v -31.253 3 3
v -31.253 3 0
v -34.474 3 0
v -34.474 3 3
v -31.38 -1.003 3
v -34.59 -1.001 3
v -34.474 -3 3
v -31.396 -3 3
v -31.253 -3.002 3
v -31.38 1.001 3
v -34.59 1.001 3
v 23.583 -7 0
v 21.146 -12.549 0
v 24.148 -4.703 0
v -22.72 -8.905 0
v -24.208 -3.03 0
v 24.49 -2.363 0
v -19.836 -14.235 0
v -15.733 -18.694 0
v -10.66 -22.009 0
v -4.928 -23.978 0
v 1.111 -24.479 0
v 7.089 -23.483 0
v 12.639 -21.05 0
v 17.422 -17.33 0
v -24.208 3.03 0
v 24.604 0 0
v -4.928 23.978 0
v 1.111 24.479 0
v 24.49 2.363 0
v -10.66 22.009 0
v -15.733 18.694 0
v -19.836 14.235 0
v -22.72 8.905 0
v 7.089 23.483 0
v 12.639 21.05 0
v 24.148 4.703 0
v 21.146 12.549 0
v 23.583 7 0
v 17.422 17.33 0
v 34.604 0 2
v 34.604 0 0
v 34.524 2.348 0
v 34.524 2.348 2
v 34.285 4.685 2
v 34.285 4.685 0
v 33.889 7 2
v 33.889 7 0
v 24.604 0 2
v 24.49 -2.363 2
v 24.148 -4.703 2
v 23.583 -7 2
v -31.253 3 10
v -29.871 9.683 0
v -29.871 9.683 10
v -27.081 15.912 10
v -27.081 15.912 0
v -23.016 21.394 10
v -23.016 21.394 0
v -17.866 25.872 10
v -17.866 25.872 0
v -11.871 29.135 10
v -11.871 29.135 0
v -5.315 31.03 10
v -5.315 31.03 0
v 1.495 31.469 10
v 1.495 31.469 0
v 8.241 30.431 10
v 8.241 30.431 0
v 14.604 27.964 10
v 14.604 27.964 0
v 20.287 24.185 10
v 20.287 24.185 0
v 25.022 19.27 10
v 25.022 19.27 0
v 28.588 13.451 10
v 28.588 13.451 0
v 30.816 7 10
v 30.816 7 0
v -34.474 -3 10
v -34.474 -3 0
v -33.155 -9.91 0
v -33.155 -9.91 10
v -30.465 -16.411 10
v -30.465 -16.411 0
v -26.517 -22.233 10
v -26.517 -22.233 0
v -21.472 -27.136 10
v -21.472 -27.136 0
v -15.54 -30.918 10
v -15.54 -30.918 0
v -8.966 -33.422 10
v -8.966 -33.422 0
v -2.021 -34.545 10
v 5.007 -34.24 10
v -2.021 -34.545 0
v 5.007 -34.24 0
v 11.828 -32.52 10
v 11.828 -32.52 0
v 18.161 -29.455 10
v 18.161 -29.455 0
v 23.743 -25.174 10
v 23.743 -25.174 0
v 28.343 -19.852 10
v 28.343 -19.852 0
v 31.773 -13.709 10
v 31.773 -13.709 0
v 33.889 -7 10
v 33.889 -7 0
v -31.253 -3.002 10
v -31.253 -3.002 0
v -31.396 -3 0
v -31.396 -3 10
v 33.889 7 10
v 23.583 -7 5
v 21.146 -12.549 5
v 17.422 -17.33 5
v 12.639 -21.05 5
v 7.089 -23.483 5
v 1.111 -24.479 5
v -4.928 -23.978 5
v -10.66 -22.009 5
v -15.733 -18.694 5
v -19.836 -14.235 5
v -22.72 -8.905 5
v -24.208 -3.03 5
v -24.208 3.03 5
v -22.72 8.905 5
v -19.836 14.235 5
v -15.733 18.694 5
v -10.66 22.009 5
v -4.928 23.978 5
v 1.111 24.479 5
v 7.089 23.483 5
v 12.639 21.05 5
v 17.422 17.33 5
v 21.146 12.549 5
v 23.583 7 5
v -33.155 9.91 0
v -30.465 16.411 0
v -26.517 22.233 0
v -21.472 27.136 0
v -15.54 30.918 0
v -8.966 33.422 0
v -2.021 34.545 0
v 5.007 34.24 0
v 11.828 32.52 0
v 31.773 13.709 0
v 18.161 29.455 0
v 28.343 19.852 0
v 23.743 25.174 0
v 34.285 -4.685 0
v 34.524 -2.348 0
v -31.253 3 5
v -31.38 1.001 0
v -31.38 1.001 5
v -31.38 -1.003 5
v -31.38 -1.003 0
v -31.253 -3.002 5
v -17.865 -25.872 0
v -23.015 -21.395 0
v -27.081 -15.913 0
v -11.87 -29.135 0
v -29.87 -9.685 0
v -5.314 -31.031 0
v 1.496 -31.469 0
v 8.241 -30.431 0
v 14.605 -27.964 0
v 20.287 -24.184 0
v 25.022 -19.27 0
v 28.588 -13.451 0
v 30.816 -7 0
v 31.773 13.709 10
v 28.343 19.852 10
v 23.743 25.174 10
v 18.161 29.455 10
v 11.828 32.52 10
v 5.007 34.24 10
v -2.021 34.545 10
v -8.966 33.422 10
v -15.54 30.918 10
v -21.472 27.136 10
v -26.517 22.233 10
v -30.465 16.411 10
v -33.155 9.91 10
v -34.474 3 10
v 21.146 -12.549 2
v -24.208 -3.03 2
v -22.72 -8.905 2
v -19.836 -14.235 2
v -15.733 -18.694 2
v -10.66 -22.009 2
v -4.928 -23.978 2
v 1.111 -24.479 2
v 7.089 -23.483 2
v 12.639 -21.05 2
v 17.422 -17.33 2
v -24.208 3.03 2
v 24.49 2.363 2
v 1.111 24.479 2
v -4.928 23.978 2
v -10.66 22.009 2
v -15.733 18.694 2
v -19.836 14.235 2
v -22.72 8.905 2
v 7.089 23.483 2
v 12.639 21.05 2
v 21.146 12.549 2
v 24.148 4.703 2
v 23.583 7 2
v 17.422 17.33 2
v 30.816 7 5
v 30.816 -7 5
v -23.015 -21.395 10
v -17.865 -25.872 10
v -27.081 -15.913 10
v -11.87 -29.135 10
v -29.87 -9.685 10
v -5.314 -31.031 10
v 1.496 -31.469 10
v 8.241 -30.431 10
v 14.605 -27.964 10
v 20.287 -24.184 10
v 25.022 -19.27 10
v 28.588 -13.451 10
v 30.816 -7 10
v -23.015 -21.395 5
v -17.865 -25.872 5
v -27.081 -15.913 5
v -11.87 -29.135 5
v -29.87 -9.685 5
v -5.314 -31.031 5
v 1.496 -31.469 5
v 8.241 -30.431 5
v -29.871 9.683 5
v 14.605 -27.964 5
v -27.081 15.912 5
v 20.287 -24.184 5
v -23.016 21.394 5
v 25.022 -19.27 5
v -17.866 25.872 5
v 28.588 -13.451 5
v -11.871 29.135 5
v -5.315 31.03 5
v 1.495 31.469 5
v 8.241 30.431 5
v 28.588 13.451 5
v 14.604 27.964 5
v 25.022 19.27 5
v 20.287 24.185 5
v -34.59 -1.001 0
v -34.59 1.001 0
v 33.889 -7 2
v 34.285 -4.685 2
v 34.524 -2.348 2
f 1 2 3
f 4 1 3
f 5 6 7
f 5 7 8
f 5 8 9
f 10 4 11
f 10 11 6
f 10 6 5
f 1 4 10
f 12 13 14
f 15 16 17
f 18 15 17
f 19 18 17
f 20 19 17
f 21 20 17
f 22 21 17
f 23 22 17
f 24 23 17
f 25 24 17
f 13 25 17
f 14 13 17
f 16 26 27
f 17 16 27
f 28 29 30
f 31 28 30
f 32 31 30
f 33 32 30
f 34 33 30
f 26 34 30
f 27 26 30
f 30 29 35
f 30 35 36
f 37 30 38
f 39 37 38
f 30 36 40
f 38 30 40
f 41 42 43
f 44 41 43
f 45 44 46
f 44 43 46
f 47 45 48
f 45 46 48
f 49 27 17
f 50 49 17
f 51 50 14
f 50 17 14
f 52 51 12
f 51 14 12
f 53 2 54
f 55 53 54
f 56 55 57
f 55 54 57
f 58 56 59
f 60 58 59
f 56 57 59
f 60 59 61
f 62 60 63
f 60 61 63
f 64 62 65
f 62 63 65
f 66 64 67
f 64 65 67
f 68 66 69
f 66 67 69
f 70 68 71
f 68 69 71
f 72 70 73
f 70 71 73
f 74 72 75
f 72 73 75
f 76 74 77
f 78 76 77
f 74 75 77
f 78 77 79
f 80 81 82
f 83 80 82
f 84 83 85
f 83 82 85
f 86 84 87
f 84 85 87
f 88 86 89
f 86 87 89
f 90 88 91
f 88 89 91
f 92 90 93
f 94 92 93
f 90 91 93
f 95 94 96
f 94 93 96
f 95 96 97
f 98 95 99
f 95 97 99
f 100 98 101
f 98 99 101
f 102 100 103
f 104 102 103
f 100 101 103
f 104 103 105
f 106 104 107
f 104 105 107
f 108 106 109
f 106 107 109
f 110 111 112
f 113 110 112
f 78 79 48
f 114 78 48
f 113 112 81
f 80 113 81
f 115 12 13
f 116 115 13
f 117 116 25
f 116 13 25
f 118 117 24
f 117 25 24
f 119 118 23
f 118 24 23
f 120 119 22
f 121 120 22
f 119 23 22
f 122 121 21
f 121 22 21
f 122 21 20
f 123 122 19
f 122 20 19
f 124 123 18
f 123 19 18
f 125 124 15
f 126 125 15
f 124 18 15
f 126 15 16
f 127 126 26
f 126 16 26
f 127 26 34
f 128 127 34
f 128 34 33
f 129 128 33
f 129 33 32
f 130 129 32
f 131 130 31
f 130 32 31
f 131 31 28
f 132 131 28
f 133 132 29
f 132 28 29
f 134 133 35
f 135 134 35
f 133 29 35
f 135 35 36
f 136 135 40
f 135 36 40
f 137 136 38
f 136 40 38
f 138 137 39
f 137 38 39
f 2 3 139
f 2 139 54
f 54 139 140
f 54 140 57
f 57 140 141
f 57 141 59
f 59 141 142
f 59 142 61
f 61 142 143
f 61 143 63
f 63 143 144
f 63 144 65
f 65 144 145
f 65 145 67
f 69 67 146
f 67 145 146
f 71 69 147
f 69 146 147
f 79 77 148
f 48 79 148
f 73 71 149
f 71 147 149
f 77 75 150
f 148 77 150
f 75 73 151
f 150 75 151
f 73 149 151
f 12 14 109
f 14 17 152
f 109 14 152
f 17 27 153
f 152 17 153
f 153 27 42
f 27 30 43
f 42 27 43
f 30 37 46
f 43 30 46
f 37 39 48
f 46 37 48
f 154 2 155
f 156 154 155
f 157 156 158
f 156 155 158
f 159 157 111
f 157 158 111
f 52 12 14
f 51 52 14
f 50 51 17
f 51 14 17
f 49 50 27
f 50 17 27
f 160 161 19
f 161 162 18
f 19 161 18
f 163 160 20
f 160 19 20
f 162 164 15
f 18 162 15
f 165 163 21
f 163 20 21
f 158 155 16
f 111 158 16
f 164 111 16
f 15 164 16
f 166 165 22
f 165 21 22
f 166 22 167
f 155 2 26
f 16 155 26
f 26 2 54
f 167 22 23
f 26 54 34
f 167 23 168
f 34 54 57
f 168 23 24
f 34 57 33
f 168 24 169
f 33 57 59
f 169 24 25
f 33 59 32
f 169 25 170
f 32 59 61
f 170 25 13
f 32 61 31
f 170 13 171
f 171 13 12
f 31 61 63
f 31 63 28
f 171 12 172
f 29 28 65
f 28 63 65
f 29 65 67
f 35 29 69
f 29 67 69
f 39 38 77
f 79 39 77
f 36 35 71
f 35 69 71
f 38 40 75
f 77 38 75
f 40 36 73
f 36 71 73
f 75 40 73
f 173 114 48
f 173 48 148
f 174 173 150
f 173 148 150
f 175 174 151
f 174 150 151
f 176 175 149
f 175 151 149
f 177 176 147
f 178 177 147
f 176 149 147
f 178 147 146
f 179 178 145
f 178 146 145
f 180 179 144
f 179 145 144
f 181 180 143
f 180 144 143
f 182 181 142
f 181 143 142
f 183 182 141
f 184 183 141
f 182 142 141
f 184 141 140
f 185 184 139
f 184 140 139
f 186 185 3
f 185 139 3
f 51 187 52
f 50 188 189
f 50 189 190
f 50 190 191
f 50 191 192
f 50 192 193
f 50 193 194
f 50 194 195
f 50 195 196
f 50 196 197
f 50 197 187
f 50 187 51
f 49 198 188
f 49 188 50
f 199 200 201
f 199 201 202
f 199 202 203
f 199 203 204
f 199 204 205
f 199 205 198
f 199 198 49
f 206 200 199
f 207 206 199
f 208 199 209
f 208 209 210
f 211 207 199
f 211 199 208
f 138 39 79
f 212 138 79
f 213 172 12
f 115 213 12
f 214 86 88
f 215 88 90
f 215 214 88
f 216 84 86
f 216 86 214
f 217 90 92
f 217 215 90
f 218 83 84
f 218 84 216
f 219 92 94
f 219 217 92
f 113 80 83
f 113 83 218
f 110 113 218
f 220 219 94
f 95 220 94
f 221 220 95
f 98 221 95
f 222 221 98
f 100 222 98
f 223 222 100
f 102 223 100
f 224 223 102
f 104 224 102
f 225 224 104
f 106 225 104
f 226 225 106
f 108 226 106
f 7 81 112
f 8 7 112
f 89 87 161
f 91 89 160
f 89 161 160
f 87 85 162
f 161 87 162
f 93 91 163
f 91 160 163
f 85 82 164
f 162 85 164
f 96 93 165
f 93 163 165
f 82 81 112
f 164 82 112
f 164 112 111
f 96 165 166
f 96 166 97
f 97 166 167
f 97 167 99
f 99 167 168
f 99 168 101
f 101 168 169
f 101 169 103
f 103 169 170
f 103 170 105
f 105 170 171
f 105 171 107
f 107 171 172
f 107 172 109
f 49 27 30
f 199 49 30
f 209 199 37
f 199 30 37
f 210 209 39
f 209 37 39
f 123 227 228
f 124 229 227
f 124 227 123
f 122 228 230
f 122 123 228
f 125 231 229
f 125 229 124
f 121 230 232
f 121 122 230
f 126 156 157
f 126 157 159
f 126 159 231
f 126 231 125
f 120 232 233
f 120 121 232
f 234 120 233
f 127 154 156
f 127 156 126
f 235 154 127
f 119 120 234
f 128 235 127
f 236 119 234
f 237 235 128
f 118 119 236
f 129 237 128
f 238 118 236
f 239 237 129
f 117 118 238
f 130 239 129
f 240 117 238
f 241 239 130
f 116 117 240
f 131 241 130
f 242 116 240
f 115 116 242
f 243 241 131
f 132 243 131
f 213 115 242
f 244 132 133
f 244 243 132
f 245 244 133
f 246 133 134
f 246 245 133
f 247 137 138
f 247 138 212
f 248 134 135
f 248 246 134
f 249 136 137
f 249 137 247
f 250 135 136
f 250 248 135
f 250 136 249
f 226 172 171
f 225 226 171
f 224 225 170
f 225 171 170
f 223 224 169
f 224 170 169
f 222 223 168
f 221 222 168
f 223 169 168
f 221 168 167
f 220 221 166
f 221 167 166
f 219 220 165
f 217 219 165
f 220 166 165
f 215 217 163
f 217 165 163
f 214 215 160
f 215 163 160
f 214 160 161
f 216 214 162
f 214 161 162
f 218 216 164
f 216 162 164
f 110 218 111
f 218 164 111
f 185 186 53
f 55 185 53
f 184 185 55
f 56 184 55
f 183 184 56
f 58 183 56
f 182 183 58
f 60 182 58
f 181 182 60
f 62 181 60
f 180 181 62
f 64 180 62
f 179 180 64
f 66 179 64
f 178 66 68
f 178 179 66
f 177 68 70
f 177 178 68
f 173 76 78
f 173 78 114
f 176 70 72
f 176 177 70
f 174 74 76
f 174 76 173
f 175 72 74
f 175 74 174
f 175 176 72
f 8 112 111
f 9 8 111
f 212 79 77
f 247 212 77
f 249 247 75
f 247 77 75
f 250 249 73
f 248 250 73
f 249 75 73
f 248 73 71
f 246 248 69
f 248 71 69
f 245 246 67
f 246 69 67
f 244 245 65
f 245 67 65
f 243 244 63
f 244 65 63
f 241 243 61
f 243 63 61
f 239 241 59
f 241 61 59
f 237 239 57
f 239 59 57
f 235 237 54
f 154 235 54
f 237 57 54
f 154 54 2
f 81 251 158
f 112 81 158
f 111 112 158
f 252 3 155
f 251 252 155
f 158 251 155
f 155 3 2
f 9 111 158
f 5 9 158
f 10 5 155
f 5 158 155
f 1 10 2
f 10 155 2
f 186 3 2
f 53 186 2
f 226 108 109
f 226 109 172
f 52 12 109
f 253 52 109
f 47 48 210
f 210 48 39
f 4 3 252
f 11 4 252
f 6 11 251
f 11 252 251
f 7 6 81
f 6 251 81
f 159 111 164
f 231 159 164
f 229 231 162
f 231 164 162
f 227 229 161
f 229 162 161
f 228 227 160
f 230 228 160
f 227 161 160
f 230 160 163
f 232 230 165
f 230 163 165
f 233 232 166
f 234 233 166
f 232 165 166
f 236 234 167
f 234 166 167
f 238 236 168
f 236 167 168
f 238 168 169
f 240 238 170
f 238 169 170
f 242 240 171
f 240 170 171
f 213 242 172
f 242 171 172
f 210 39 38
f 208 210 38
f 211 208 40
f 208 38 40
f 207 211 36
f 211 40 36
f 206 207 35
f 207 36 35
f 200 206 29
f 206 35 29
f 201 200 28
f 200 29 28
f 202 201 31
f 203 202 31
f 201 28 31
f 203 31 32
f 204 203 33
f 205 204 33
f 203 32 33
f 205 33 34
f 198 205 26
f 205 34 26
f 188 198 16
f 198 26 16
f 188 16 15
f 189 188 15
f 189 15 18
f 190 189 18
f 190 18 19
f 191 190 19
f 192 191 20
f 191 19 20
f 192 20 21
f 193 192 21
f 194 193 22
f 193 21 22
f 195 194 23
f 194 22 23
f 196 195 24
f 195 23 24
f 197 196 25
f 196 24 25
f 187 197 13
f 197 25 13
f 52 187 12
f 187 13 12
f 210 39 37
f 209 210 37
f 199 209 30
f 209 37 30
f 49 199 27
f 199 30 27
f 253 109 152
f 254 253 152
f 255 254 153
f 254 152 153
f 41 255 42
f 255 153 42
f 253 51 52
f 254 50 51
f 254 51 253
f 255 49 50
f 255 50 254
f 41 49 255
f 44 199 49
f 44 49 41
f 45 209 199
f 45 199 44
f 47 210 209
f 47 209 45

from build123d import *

# Parameters (mm, degrees)
F1_DEPTH = 10
F2_DEPTH = 3
F3_DEPTH = 2
F4_DEPTH = 5
F5_DEPTH = 2


with BuildPart() as f1:
    # F0 (on Top) → F1 (new body)
    with BuildSketch(Plane.XY):
        with BuildLine():
            ThreePointArc((-31.252798, 3), (-1.921771, 31.434792), (30.816394, 7))
            Line((30.816394, 7), (33.888614, 7))
            ThreePointArc((33.888614, 7), (-2.021284, 34.544935), (-34.473731, 3))
            Line((-34.473731, 3), (-31.395981, 3))
            Line((-31.395981, 3), (-31.252798, 3))
        make_face()
        with BuildLine():
            Line((33.888614, -7), (30.816394, -7))
            ThreePointArc((30.816394, -7), (-1.920884, -31.43485), (-31.252629, -3.00177))
            Line((-31.252629, -3.00177), (-31.395981, -3))
            Line((-31.395981, -3), (-34.473731, -3))
            ThreePointArc((-34.473731, -3), (-2.021284, -34.544935), (33.888614, -7))
        make_face()
    extrude(amount=F1_DEPTH)


with BuildPart() as f2:
    # F0 (on Top) → F2 (new body)
    with BuildSketch(Plane.XY):
        with BuildLine():
            ThreePointArc((-31.252629, -3.00177), (-31.395981, -0.000889), (-31.252798, 3))
            Line((-31.252798, 3), (-31.395981, 3))
            Line((-31.395981, 3), (-34.473731, 3))
            ThreePointArc((-34.473731, 3), (-34.604019, 0), (-34.473731, -3))
            Line((-34.473731, -3), (-31.395981, -3))
            Line((-31.395981, -3), (-31.252629, -3.00177))
        make_face()
    extrude(amount=F2_DEPTH)


with BuildPart() as f3:
    # F0 (on Top) → F3 (new body)
    with BuildSketch(Plane.XY):
        with BuildLine():
            ThreePointArc((23.582733, -7), (24.347353, -3.537055), (24.604019, 0))
            ThreePointArc((24.604019, 0), (24.347353, 3.537055), (23.582733, 7))
            ThreePointArc((23.582733, 7), (-24.395981, 0), (23.582733, -7))
        make_face()
    extrude(amount=F3_DEPTH)


with BuildPart() as f4:
    # F0 (on Top) → F4 (new body)
    with BuildSketch(Plane.XY):
        with BuildLine():
            ThreePointArc((23.582733, -7), (-24.395981, 0), (23.582733, 7))
            Line((23.582733, 7), (24.604019, 7))
            Line((24.604019, 7), (30.816394, 7))
            ThreePointArc((30.816394, 7), (-1.921771, 31.434792), (-31.252798, 3))
            ThreePointArc((-31.252798, 3), (-31.395981, -0.000889), (-31.252629, -3.00177))
            ThreePointArc((-31.252629, -3.00177), (-1.920884, -31.43485), (30.816394, -7))
            Line((30.816394, -7), (24.604019, -7))
            Line((24.604019, -7), (23.582733, -7))
        make_face()
    extrude(amount=F4_DEPTH)


with BuildPart() as f5:
    # F0 (on Top) → F5 (new body)
    with BuildSketch(Plane.XY):
        with BuildLine():
            ThreePointArc((23.582733, 7), (24.347353, 3.537055), (24.604019, 0))
            Line((24.604019, 0), (31.604019, 0))
            ThreePointArc((31.604019, 0), (31.406494, 3.522086), (30.816394, 7))
            Line((30.816394, 7), (24.604019, 7))
            Line((24.604019, 7), (23.582733, 7))
        make_face()
        with BuildLine():
            Line((31.604019, 0), (24.604019, 0))
            ThreePointArc((24.604019, 0), (24.347353, -3.537055), (23.582733, -7))
            Line((23.582733, -7), (24.604019, -7))
            Line((24.604019, -7), (30.816394, -7))
            ThreePointArc((30.816394, -7), (31.406494, -3.522086), (31.604019, 0))
        make_face()
        with BuildLine():
            Line((34.604019, 0), (31.604019, 0))
            ThreePointArc((31.604019, 0), (31.406494, -3.522086), (30.816394, -7))
            Line((30.816394, -7), (33.888614, -7))
            ThreePointArc((33.888614, -7), (34.424703, -3.518231), (34.604019, 0))
        make_face()
        with BuildLine():
            ThreePointArc((30.816394, 7), (31.406494, 3.522086), (31.604019, 0))
            Line((31.604019, 0), (34.604019, 0))
            ThreePointArc((34.604019, 0), (34.424703, 3.518231), (33.888614, 7))
            Line((33.888614, 7), (30.816394, 7))
        make_face()
    extrude(amount=F5_DEPTH)


solid = Compound([f1.part, f2.part, f3.part, f4.part, f5.part])
